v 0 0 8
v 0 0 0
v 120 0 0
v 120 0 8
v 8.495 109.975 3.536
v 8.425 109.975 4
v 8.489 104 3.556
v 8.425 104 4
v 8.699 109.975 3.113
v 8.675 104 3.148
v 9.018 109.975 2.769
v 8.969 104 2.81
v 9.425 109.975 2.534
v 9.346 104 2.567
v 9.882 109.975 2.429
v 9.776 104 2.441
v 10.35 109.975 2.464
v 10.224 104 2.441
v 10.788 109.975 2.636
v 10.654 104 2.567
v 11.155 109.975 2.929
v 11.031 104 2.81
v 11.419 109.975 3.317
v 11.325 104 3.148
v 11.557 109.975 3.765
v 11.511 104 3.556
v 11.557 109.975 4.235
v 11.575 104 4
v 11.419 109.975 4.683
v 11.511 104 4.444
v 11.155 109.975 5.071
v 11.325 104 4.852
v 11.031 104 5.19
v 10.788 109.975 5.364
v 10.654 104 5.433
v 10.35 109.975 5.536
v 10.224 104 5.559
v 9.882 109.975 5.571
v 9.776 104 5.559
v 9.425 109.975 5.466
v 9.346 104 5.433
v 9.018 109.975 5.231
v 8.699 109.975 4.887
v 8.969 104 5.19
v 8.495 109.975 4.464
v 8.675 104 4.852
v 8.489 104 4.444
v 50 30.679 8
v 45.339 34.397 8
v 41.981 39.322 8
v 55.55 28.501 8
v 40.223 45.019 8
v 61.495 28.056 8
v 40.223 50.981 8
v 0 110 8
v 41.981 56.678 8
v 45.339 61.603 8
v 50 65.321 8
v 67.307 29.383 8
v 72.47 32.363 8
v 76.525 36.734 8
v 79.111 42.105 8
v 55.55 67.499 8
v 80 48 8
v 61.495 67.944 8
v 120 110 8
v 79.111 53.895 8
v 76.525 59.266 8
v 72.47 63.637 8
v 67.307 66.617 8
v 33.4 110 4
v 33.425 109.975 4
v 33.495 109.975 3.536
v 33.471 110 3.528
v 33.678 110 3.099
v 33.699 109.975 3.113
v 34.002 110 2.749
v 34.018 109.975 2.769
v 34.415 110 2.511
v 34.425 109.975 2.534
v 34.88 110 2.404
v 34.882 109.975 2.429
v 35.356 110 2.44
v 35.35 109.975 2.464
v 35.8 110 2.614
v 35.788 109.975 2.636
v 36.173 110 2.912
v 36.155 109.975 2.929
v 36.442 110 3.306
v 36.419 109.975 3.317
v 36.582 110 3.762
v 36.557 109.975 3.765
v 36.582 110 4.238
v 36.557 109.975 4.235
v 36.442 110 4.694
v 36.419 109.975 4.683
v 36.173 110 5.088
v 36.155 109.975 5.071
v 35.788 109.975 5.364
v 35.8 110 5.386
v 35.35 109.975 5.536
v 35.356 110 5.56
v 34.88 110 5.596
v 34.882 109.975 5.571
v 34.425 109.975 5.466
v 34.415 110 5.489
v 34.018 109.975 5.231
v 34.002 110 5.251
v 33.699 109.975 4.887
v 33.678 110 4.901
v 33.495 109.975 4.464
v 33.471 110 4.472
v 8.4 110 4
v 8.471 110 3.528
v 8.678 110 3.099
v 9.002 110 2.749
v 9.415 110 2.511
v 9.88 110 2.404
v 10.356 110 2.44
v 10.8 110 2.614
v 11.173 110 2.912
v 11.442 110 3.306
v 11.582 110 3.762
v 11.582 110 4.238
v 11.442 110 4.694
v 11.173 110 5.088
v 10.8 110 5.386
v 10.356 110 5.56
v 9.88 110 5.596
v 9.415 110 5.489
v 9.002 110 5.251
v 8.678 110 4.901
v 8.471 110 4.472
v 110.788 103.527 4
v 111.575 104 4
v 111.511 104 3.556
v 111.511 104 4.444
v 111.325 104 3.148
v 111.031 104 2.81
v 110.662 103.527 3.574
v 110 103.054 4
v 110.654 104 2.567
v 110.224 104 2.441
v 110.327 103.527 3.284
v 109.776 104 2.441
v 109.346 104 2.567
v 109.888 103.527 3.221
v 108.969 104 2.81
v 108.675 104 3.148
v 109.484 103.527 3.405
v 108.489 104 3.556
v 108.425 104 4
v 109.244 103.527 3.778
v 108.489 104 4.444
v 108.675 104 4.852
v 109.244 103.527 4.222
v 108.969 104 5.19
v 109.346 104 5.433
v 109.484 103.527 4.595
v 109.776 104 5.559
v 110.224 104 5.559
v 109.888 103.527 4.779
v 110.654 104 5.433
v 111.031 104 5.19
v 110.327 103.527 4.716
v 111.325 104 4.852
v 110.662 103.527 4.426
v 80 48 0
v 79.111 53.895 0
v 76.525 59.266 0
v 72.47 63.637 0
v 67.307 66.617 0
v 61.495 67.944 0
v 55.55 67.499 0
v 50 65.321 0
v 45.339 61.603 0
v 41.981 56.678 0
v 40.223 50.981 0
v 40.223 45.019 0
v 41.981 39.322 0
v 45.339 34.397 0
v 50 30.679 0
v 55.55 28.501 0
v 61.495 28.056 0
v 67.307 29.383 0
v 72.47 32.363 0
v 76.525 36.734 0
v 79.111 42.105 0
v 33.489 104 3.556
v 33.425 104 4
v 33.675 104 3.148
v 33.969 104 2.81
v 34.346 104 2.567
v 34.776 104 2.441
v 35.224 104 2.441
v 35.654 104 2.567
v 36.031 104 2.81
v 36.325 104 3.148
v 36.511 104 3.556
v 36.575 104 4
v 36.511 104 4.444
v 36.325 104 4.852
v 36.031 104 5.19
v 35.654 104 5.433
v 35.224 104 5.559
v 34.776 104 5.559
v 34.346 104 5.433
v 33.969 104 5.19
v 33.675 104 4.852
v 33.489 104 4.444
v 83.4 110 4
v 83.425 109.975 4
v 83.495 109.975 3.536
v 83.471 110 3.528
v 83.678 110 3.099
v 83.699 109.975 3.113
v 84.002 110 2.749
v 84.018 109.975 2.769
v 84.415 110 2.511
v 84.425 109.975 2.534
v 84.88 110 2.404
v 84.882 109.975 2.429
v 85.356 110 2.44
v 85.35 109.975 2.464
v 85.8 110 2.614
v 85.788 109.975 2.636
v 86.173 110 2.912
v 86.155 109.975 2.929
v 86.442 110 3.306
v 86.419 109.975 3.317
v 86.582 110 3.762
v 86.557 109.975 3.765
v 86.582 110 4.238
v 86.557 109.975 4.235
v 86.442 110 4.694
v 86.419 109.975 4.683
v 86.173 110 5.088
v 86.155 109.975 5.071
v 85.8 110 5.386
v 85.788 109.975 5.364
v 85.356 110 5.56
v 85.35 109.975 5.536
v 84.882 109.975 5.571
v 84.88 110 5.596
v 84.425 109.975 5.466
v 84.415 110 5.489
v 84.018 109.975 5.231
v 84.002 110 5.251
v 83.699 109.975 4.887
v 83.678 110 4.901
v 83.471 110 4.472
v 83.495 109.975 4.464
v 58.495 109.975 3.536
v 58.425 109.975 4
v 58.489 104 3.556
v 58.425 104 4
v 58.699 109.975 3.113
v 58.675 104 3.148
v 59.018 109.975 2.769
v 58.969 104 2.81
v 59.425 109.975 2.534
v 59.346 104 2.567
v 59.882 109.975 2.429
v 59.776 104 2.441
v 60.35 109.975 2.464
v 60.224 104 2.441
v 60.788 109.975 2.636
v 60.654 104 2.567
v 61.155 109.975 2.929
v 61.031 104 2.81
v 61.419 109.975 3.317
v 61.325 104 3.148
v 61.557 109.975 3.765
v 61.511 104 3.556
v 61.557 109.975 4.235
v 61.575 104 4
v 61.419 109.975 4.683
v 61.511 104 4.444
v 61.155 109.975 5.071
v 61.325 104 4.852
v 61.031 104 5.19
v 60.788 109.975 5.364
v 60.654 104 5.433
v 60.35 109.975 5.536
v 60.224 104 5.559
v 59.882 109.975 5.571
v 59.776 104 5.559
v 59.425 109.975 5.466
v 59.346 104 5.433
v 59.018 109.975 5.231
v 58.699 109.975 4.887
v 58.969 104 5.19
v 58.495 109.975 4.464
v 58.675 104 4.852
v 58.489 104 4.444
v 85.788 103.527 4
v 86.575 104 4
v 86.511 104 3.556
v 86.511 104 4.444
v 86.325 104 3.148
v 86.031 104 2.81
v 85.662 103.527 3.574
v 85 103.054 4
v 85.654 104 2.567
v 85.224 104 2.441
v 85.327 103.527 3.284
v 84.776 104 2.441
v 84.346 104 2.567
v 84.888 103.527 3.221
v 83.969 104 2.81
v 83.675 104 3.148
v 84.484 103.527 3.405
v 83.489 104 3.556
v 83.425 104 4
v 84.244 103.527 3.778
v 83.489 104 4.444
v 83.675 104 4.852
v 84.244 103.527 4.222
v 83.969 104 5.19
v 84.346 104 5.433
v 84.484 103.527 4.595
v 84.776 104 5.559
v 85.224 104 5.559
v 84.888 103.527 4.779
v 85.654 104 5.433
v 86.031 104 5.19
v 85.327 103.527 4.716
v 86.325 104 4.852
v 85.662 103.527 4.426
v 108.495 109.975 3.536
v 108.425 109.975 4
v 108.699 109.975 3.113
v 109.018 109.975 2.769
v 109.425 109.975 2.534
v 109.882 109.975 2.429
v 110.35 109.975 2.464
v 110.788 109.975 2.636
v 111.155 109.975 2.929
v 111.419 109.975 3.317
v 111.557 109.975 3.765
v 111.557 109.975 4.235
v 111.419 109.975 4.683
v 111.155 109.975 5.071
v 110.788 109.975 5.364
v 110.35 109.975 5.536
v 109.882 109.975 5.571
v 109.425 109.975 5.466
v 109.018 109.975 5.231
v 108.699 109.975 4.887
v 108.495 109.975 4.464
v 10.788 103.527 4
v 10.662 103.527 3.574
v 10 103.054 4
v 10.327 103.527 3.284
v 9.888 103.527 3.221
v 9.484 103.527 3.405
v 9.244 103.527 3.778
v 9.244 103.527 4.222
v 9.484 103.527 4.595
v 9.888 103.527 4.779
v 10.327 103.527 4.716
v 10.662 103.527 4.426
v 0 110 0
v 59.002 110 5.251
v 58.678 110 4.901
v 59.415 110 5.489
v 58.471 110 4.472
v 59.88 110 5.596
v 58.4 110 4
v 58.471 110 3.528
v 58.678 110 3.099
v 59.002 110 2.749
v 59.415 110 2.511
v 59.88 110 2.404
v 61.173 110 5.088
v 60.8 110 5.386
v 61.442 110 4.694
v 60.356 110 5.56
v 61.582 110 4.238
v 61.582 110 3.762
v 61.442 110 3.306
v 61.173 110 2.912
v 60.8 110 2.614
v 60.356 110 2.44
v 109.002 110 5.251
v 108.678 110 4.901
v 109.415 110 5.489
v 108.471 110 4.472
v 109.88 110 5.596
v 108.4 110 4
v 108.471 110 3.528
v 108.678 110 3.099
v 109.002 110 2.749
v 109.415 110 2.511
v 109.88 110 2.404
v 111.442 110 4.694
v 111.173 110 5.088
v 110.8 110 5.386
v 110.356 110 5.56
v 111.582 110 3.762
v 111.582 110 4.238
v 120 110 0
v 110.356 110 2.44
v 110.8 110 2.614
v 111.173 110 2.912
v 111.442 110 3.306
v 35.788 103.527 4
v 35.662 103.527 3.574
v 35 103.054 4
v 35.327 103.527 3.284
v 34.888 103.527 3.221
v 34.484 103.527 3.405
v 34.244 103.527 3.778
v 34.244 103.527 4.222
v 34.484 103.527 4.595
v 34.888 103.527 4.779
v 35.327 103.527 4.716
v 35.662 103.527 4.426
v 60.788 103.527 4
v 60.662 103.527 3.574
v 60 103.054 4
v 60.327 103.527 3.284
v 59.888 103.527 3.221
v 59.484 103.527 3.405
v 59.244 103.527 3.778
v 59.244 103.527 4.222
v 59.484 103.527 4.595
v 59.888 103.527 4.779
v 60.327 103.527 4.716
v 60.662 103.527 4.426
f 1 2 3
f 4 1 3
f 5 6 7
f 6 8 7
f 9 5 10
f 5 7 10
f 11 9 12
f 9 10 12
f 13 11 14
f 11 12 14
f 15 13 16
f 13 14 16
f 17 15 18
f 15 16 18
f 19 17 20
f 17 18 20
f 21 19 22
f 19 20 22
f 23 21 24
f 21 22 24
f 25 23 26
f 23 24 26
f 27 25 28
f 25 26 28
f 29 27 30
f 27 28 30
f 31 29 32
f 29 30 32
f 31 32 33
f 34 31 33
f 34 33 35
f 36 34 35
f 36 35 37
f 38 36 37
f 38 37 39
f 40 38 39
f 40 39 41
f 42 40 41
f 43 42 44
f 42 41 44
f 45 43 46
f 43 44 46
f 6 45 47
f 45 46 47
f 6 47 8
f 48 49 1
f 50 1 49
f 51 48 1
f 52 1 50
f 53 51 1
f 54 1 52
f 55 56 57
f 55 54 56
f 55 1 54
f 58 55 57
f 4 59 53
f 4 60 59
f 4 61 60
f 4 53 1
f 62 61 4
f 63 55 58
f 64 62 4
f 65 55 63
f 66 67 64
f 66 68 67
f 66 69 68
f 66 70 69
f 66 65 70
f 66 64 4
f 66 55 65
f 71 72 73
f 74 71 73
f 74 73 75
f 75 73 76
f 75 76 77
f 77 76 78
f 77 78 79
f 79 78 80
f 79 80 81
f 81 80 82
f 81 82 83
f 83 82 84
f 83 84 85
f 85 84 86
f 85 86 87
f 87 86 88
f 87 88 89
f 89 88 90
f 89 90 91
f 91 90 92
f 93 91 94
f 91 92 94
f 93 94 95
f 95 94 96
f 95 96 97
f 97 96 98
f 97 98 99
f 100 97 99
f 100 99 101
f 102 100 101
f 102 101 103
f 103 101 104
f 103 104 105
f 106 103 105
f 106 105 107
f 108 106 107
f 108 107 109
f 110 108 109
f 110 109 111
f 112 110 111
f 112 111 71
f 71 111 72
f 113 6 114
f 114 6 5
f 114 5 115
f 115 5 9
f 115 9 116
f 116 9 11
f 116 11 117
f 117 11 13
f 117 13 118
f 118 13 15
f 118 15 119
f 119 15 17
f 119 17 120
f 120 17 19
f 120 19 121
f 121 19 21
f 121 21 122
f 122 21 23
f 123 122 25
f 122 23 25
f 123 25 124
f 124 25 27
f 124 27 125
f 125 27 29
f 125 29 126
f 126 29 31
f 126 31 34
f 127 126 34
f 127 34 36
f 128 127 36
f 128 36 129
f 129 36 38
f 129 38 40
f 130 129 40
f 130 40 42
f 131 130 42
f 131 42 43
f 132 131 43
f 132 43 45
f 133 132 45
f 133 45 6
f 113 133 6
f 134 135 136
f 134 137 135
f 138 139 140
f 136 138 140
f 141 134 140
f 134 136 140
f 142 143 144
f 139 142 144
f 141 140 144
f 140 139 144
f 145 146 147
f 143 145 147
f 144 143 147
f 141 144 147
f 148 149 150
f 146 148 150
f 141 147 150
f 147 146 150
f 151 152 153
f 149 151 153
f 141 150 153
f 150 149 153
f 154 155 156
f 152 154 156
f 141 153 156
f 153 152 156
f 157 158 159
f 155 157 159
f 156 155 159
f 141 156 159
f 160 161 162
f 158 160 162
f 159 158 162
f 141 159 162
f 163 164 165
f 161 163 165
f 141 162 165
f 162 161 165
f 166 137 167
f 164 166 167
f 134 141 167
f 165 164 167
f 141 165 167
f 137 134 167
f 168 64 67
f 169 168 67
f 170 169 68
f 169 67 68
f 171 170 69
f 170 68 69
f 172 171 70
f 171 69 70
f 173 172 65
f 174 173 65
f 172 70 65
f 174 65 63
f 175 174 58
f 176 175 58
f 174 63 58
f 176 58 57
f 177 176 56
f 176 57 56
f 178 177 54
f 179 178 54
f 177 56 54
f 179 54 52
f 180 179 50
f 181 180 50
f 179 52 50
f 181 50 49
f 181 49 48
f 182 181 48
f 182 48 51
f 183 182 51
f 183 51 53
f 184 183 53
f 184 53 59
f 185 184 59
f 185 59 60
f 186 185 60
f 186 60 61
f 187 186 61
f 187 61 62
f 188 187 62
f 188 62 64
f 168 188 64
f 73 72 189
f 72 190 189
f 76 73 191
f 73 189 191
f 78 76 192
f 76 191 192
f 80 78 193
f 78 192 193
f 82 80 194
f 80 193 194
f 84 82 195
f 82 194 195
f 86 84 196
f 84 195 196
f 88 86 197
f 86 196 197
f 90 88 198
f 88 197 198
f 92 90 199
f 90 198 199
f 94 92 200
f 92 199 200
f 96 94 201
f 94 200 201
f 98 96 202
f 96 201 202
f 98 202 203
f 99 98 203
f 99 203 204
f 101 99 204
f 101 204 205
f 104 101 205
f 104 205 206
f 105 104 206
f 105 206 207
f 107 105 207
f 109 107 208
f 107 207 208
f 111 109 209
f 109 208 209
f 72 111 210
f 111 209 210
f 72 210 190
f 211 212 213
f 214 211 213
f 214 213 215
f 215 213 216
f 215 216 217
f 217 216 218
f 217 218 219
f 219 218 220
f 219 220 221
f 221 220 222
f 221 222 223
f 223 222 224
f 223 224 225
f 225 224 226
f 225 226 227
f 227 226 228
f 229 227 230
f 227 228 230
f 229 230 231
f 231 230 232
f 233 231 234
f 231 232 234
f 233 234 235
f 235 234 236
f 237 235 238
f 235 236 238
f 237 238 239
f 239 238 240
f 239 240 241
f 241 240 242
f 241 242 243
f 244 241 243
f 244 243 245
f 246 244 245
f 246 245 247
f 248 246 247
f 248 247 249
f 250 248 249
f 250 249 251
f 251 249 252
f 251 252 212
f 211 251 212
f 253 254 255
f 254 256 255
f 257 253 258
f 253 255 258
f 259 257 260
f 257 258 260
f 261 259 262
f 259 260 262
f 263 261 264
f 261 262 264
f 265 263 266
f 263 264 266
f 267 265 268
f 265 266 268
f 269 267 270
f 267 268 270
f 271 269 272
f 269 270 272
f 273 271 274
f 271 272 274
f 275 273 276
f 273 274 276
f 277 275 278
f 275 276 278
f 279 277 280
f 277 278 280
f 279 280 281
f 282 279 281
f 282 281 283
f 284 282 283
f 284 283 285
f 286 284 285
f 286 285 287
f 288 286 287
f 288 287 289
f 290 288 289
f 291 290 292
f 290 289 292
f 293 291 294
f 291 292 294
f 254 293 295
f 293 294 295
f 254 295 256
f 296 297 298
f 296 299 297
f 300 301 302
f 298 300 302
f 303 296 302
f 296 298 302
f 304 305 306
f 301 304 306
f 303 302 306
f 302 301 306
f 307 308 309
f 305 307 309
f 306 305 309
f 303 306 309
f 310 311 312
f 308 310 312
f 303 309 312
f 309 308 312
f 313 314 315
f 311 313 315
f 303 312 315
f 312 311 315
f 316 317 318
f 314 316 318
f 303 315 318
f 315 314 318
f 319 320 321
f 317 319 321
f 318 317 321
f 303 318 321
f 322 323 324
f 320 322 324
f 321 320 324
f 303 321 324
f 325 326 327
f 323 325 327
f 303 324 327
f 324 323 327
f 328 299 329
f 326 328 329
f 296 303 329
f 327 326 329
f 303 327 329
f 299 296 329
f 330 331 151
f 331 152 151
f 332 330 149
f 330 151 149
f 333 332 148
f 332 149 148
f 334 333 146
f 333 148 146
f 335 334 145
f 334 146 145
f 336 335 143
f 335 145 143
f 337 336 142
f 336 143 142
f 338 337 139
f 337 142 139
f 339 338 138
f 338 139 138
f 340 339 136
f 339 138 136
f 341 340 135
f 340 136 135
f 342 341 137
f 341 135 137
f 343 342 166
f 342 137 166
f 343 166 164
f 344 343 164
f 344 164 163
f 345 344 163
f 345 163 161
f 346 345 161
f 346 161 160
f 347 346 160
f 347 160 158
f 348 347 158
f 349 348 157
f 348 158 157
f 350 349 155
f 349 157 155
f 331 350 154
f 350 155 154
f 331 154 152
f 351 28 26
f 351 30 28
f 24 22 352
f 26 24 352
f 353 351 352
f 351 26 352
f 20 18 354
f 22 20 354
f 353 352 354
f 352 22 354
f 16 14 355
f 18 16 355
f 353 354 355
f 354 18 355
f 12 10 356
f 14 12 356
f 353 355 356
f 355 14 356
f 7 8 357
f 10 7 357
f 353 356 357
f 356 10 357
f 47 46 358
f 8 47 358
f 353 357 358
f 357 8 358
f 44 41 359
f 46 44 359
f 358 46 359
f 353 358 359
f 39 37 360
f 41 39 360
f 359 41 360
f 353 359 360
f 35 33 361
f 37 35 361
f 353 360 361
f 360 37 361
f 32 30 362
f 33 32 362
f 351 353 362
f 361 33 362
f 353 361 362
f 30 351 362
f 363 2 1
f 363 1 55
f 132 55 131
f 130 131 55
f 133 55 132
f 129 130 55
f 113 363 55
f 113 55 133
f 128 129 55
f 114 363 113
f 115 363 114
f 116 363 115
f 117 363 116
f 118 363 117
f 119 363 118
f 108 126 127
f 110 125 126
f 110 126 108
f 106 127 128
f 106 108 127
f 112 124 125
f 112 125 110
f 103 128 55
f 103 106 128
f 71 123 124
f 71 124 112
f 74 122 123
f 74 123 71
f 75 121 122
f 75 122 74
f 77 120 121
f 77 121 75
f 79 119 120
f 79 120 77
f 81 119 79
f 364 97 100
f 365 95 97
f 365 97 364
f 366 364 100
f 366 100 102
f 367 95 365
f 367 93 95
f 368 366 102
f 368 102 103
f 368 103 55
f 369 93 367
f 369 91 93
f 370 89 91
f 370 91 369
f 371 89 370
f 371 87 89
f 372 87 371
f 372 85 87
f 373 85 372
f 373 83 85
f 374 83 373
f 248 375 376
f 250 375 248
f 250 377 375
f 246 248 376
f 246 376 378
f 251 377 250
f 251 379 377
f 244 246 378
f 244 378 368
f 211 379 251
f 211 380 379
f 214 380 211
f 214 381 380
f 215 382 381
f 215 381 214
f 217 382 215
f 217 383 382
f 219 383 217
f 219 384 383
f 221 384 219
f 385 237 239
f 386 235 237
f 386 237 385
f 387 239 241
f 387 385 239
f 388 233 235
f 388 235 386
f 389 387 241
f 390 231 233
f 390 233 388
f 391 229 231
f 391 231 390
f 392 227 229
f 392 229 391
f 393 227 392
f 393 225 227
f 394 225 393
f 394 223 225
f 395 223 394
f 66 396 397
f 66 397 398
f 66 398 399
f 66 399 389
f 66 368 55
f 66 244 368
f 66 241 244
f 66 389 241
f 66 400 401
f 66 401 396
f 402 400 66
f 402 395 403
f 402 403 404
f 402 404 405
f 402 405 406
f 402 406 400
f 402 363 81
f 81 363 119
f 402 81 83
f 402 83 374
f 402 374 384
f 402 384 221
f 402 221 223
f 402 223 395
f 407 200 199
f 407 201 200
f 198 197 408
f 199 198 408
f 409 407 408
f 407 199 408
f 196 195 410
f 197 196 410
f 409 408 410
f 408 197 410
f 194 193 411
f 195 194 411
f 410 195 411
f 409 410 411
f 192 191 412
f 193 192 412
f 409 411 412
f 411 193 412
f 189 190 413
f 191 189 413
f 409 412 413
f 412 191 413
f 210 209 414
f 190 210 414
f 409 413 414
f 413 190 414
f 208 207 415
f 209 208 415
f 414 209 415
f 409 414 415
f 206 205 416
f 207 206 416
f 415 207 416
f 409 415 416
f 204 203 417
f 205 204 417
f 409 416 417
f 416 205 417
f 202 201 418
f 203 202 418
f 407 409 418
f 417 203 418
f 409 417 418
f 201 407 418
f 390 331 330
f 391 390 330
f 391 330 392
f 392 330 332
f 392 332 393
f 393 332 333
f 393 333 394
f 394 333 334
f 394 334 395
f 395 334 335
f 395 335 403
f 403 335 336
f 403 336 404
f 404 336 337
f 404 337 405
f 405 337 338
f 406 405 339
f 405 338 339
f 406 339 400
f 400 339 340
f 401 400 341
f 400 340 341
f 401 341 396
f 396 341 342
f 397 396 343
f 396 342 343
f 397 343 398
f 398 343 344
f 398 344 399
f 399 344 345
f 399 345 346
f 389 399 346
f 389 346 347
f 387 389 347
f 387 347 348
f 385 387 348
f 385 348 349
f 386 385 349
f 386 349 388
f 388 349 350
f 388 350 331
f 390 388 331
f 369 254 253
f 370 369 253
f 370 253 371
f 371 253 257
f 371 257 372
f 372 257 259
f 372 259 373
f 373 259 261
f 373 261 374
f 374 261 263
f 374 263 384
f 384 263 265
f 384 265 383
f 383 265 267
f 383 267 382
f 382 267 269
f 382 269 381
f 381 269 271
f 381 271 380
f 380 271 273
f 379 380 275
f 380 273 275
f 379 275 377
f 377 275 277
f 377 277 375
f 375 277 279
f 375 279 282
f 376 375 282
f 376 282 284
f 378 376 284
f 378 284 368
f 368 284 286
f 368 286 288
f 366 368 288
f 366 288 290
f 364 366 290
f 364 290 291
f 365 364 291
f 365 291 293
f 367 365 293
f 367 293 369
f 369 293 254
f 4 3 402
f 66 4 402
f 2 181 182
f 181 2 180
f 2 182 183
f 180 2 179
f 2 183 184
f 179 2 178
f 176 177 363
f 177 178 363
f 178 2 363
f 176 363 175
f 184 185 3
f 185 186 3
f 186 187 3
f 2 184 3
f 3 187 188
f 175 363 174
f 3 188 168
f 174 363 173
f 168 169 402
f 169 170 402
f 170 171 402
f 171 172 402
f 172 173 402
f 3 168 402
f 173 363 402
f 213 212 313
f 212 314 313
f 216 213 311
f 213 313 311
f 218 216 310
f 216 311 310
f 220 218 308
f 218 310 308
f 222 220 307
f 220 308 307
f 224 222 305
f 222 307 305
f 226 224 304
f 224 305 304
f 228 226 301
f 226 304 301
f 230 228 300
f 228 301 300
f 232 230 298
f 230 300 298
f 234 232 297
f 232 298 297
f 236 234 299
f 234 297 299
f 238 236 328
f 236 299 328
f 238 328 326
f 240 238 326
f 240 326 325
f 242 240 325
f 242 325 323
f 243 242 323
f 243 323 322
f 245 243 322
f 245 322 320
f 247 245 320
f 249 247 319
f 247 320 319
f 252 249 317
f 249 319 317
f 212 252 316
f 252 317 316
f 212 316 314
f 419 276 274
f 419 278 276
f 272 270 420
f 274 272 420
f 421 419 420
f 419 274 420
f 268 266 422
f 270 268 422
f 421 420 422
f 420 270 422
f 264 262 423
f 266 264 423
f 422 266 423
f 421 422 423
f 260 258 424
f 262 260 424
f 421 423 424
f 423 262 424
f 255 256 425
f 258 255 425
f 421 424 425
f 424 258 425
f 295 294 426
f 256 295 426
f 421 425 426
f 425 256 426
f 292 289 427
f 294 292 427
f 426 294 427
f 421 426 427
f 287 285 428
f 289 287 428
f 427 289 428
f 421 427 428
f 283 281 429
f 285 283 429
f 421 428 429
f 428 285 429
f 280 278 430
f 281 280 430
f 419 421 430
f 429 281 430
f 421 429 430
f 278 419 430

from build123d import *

# Parameters (mm, degrees)
SKETCH1_W                              = 120
SKETCH1_H                              = 110
BOSS_EXTRUDE1_DEPTH                    = 8
TAP_DRILL_FOR_M3_HELICOIL1_D           = 3.15
TAP_DRILL_FOR_M3_HELICOIL1_DEPTH       = 6
TAP_DRILL_FOR_M3_HELICOIL1_CSINK_D     = 3.2
TAP_DRILL_FOR_M3_HELICOIL1_CSINK_ANGLE = 90
TAP_DRILL_FOR_M3_HELICOIL1_TIP         = 0.946355475
F_40_0_40_DIAMETER_HOLE1_D             = 40


with BuildPart() as part:
    # Sketch1 → Boss-Extrude1 (new body)
    with BuildSketch(Plane.XY):
        with Locations((60, 55)):
            Rectangle(SKETCH1_W, SKETCH1_H)
    extrude(amount=BOSS_EXTRUDE1_DEPTH)

    # Tap Drill for M3 Helicoil1
    with Locations(Plane(origin=(0, 110, 0), x_dir=(1, 0, 0), z_dir=(0, 1, 0))):
        with Locations((10, -4), (60, -4), (85, -4), (110, -4), (35, -4)):
            CounterSinkHole(TAP_DRILL_FOR_M3_HELICOIL1_D / 2, TAP_DRILL_FOR_M3_HELICOIL1_CSINK_D / 2, depth=TAP_DRILL_FOR_M3_HELICOIL1_DEPTH, counter_sink_angle=TAP_DRILL_FOR_M3_HELICOIL1_CSINK_ANGLE)
            with Locations((0, 0, -(TAP_DRILL_FOR_M3_HELICOIL1_DEPTH + TAP_DRILL_FOR_M3_HELICOIL1_TIP / 2))):  # 118° drill point
                Cone(0, TAP_DRILL_FOR_M3_HELICOIL1_D / 2, TAP_DRILL_FOR_M3_HELICOIL1_TIP, mode=Mode.SUBTRACT)

    # Ø40.0 (40) Diameter Hole1 (through all)
    with Locations(Plane(origin=(0, 0, 0), x_dir=(-1, 0, 0), z_dir=(0, 0, -1))):
        with Locations((-60, 48)):
            Hole(F_40_0_40_DIAMETER_HOLE1_D / 2)


solid = part.part
